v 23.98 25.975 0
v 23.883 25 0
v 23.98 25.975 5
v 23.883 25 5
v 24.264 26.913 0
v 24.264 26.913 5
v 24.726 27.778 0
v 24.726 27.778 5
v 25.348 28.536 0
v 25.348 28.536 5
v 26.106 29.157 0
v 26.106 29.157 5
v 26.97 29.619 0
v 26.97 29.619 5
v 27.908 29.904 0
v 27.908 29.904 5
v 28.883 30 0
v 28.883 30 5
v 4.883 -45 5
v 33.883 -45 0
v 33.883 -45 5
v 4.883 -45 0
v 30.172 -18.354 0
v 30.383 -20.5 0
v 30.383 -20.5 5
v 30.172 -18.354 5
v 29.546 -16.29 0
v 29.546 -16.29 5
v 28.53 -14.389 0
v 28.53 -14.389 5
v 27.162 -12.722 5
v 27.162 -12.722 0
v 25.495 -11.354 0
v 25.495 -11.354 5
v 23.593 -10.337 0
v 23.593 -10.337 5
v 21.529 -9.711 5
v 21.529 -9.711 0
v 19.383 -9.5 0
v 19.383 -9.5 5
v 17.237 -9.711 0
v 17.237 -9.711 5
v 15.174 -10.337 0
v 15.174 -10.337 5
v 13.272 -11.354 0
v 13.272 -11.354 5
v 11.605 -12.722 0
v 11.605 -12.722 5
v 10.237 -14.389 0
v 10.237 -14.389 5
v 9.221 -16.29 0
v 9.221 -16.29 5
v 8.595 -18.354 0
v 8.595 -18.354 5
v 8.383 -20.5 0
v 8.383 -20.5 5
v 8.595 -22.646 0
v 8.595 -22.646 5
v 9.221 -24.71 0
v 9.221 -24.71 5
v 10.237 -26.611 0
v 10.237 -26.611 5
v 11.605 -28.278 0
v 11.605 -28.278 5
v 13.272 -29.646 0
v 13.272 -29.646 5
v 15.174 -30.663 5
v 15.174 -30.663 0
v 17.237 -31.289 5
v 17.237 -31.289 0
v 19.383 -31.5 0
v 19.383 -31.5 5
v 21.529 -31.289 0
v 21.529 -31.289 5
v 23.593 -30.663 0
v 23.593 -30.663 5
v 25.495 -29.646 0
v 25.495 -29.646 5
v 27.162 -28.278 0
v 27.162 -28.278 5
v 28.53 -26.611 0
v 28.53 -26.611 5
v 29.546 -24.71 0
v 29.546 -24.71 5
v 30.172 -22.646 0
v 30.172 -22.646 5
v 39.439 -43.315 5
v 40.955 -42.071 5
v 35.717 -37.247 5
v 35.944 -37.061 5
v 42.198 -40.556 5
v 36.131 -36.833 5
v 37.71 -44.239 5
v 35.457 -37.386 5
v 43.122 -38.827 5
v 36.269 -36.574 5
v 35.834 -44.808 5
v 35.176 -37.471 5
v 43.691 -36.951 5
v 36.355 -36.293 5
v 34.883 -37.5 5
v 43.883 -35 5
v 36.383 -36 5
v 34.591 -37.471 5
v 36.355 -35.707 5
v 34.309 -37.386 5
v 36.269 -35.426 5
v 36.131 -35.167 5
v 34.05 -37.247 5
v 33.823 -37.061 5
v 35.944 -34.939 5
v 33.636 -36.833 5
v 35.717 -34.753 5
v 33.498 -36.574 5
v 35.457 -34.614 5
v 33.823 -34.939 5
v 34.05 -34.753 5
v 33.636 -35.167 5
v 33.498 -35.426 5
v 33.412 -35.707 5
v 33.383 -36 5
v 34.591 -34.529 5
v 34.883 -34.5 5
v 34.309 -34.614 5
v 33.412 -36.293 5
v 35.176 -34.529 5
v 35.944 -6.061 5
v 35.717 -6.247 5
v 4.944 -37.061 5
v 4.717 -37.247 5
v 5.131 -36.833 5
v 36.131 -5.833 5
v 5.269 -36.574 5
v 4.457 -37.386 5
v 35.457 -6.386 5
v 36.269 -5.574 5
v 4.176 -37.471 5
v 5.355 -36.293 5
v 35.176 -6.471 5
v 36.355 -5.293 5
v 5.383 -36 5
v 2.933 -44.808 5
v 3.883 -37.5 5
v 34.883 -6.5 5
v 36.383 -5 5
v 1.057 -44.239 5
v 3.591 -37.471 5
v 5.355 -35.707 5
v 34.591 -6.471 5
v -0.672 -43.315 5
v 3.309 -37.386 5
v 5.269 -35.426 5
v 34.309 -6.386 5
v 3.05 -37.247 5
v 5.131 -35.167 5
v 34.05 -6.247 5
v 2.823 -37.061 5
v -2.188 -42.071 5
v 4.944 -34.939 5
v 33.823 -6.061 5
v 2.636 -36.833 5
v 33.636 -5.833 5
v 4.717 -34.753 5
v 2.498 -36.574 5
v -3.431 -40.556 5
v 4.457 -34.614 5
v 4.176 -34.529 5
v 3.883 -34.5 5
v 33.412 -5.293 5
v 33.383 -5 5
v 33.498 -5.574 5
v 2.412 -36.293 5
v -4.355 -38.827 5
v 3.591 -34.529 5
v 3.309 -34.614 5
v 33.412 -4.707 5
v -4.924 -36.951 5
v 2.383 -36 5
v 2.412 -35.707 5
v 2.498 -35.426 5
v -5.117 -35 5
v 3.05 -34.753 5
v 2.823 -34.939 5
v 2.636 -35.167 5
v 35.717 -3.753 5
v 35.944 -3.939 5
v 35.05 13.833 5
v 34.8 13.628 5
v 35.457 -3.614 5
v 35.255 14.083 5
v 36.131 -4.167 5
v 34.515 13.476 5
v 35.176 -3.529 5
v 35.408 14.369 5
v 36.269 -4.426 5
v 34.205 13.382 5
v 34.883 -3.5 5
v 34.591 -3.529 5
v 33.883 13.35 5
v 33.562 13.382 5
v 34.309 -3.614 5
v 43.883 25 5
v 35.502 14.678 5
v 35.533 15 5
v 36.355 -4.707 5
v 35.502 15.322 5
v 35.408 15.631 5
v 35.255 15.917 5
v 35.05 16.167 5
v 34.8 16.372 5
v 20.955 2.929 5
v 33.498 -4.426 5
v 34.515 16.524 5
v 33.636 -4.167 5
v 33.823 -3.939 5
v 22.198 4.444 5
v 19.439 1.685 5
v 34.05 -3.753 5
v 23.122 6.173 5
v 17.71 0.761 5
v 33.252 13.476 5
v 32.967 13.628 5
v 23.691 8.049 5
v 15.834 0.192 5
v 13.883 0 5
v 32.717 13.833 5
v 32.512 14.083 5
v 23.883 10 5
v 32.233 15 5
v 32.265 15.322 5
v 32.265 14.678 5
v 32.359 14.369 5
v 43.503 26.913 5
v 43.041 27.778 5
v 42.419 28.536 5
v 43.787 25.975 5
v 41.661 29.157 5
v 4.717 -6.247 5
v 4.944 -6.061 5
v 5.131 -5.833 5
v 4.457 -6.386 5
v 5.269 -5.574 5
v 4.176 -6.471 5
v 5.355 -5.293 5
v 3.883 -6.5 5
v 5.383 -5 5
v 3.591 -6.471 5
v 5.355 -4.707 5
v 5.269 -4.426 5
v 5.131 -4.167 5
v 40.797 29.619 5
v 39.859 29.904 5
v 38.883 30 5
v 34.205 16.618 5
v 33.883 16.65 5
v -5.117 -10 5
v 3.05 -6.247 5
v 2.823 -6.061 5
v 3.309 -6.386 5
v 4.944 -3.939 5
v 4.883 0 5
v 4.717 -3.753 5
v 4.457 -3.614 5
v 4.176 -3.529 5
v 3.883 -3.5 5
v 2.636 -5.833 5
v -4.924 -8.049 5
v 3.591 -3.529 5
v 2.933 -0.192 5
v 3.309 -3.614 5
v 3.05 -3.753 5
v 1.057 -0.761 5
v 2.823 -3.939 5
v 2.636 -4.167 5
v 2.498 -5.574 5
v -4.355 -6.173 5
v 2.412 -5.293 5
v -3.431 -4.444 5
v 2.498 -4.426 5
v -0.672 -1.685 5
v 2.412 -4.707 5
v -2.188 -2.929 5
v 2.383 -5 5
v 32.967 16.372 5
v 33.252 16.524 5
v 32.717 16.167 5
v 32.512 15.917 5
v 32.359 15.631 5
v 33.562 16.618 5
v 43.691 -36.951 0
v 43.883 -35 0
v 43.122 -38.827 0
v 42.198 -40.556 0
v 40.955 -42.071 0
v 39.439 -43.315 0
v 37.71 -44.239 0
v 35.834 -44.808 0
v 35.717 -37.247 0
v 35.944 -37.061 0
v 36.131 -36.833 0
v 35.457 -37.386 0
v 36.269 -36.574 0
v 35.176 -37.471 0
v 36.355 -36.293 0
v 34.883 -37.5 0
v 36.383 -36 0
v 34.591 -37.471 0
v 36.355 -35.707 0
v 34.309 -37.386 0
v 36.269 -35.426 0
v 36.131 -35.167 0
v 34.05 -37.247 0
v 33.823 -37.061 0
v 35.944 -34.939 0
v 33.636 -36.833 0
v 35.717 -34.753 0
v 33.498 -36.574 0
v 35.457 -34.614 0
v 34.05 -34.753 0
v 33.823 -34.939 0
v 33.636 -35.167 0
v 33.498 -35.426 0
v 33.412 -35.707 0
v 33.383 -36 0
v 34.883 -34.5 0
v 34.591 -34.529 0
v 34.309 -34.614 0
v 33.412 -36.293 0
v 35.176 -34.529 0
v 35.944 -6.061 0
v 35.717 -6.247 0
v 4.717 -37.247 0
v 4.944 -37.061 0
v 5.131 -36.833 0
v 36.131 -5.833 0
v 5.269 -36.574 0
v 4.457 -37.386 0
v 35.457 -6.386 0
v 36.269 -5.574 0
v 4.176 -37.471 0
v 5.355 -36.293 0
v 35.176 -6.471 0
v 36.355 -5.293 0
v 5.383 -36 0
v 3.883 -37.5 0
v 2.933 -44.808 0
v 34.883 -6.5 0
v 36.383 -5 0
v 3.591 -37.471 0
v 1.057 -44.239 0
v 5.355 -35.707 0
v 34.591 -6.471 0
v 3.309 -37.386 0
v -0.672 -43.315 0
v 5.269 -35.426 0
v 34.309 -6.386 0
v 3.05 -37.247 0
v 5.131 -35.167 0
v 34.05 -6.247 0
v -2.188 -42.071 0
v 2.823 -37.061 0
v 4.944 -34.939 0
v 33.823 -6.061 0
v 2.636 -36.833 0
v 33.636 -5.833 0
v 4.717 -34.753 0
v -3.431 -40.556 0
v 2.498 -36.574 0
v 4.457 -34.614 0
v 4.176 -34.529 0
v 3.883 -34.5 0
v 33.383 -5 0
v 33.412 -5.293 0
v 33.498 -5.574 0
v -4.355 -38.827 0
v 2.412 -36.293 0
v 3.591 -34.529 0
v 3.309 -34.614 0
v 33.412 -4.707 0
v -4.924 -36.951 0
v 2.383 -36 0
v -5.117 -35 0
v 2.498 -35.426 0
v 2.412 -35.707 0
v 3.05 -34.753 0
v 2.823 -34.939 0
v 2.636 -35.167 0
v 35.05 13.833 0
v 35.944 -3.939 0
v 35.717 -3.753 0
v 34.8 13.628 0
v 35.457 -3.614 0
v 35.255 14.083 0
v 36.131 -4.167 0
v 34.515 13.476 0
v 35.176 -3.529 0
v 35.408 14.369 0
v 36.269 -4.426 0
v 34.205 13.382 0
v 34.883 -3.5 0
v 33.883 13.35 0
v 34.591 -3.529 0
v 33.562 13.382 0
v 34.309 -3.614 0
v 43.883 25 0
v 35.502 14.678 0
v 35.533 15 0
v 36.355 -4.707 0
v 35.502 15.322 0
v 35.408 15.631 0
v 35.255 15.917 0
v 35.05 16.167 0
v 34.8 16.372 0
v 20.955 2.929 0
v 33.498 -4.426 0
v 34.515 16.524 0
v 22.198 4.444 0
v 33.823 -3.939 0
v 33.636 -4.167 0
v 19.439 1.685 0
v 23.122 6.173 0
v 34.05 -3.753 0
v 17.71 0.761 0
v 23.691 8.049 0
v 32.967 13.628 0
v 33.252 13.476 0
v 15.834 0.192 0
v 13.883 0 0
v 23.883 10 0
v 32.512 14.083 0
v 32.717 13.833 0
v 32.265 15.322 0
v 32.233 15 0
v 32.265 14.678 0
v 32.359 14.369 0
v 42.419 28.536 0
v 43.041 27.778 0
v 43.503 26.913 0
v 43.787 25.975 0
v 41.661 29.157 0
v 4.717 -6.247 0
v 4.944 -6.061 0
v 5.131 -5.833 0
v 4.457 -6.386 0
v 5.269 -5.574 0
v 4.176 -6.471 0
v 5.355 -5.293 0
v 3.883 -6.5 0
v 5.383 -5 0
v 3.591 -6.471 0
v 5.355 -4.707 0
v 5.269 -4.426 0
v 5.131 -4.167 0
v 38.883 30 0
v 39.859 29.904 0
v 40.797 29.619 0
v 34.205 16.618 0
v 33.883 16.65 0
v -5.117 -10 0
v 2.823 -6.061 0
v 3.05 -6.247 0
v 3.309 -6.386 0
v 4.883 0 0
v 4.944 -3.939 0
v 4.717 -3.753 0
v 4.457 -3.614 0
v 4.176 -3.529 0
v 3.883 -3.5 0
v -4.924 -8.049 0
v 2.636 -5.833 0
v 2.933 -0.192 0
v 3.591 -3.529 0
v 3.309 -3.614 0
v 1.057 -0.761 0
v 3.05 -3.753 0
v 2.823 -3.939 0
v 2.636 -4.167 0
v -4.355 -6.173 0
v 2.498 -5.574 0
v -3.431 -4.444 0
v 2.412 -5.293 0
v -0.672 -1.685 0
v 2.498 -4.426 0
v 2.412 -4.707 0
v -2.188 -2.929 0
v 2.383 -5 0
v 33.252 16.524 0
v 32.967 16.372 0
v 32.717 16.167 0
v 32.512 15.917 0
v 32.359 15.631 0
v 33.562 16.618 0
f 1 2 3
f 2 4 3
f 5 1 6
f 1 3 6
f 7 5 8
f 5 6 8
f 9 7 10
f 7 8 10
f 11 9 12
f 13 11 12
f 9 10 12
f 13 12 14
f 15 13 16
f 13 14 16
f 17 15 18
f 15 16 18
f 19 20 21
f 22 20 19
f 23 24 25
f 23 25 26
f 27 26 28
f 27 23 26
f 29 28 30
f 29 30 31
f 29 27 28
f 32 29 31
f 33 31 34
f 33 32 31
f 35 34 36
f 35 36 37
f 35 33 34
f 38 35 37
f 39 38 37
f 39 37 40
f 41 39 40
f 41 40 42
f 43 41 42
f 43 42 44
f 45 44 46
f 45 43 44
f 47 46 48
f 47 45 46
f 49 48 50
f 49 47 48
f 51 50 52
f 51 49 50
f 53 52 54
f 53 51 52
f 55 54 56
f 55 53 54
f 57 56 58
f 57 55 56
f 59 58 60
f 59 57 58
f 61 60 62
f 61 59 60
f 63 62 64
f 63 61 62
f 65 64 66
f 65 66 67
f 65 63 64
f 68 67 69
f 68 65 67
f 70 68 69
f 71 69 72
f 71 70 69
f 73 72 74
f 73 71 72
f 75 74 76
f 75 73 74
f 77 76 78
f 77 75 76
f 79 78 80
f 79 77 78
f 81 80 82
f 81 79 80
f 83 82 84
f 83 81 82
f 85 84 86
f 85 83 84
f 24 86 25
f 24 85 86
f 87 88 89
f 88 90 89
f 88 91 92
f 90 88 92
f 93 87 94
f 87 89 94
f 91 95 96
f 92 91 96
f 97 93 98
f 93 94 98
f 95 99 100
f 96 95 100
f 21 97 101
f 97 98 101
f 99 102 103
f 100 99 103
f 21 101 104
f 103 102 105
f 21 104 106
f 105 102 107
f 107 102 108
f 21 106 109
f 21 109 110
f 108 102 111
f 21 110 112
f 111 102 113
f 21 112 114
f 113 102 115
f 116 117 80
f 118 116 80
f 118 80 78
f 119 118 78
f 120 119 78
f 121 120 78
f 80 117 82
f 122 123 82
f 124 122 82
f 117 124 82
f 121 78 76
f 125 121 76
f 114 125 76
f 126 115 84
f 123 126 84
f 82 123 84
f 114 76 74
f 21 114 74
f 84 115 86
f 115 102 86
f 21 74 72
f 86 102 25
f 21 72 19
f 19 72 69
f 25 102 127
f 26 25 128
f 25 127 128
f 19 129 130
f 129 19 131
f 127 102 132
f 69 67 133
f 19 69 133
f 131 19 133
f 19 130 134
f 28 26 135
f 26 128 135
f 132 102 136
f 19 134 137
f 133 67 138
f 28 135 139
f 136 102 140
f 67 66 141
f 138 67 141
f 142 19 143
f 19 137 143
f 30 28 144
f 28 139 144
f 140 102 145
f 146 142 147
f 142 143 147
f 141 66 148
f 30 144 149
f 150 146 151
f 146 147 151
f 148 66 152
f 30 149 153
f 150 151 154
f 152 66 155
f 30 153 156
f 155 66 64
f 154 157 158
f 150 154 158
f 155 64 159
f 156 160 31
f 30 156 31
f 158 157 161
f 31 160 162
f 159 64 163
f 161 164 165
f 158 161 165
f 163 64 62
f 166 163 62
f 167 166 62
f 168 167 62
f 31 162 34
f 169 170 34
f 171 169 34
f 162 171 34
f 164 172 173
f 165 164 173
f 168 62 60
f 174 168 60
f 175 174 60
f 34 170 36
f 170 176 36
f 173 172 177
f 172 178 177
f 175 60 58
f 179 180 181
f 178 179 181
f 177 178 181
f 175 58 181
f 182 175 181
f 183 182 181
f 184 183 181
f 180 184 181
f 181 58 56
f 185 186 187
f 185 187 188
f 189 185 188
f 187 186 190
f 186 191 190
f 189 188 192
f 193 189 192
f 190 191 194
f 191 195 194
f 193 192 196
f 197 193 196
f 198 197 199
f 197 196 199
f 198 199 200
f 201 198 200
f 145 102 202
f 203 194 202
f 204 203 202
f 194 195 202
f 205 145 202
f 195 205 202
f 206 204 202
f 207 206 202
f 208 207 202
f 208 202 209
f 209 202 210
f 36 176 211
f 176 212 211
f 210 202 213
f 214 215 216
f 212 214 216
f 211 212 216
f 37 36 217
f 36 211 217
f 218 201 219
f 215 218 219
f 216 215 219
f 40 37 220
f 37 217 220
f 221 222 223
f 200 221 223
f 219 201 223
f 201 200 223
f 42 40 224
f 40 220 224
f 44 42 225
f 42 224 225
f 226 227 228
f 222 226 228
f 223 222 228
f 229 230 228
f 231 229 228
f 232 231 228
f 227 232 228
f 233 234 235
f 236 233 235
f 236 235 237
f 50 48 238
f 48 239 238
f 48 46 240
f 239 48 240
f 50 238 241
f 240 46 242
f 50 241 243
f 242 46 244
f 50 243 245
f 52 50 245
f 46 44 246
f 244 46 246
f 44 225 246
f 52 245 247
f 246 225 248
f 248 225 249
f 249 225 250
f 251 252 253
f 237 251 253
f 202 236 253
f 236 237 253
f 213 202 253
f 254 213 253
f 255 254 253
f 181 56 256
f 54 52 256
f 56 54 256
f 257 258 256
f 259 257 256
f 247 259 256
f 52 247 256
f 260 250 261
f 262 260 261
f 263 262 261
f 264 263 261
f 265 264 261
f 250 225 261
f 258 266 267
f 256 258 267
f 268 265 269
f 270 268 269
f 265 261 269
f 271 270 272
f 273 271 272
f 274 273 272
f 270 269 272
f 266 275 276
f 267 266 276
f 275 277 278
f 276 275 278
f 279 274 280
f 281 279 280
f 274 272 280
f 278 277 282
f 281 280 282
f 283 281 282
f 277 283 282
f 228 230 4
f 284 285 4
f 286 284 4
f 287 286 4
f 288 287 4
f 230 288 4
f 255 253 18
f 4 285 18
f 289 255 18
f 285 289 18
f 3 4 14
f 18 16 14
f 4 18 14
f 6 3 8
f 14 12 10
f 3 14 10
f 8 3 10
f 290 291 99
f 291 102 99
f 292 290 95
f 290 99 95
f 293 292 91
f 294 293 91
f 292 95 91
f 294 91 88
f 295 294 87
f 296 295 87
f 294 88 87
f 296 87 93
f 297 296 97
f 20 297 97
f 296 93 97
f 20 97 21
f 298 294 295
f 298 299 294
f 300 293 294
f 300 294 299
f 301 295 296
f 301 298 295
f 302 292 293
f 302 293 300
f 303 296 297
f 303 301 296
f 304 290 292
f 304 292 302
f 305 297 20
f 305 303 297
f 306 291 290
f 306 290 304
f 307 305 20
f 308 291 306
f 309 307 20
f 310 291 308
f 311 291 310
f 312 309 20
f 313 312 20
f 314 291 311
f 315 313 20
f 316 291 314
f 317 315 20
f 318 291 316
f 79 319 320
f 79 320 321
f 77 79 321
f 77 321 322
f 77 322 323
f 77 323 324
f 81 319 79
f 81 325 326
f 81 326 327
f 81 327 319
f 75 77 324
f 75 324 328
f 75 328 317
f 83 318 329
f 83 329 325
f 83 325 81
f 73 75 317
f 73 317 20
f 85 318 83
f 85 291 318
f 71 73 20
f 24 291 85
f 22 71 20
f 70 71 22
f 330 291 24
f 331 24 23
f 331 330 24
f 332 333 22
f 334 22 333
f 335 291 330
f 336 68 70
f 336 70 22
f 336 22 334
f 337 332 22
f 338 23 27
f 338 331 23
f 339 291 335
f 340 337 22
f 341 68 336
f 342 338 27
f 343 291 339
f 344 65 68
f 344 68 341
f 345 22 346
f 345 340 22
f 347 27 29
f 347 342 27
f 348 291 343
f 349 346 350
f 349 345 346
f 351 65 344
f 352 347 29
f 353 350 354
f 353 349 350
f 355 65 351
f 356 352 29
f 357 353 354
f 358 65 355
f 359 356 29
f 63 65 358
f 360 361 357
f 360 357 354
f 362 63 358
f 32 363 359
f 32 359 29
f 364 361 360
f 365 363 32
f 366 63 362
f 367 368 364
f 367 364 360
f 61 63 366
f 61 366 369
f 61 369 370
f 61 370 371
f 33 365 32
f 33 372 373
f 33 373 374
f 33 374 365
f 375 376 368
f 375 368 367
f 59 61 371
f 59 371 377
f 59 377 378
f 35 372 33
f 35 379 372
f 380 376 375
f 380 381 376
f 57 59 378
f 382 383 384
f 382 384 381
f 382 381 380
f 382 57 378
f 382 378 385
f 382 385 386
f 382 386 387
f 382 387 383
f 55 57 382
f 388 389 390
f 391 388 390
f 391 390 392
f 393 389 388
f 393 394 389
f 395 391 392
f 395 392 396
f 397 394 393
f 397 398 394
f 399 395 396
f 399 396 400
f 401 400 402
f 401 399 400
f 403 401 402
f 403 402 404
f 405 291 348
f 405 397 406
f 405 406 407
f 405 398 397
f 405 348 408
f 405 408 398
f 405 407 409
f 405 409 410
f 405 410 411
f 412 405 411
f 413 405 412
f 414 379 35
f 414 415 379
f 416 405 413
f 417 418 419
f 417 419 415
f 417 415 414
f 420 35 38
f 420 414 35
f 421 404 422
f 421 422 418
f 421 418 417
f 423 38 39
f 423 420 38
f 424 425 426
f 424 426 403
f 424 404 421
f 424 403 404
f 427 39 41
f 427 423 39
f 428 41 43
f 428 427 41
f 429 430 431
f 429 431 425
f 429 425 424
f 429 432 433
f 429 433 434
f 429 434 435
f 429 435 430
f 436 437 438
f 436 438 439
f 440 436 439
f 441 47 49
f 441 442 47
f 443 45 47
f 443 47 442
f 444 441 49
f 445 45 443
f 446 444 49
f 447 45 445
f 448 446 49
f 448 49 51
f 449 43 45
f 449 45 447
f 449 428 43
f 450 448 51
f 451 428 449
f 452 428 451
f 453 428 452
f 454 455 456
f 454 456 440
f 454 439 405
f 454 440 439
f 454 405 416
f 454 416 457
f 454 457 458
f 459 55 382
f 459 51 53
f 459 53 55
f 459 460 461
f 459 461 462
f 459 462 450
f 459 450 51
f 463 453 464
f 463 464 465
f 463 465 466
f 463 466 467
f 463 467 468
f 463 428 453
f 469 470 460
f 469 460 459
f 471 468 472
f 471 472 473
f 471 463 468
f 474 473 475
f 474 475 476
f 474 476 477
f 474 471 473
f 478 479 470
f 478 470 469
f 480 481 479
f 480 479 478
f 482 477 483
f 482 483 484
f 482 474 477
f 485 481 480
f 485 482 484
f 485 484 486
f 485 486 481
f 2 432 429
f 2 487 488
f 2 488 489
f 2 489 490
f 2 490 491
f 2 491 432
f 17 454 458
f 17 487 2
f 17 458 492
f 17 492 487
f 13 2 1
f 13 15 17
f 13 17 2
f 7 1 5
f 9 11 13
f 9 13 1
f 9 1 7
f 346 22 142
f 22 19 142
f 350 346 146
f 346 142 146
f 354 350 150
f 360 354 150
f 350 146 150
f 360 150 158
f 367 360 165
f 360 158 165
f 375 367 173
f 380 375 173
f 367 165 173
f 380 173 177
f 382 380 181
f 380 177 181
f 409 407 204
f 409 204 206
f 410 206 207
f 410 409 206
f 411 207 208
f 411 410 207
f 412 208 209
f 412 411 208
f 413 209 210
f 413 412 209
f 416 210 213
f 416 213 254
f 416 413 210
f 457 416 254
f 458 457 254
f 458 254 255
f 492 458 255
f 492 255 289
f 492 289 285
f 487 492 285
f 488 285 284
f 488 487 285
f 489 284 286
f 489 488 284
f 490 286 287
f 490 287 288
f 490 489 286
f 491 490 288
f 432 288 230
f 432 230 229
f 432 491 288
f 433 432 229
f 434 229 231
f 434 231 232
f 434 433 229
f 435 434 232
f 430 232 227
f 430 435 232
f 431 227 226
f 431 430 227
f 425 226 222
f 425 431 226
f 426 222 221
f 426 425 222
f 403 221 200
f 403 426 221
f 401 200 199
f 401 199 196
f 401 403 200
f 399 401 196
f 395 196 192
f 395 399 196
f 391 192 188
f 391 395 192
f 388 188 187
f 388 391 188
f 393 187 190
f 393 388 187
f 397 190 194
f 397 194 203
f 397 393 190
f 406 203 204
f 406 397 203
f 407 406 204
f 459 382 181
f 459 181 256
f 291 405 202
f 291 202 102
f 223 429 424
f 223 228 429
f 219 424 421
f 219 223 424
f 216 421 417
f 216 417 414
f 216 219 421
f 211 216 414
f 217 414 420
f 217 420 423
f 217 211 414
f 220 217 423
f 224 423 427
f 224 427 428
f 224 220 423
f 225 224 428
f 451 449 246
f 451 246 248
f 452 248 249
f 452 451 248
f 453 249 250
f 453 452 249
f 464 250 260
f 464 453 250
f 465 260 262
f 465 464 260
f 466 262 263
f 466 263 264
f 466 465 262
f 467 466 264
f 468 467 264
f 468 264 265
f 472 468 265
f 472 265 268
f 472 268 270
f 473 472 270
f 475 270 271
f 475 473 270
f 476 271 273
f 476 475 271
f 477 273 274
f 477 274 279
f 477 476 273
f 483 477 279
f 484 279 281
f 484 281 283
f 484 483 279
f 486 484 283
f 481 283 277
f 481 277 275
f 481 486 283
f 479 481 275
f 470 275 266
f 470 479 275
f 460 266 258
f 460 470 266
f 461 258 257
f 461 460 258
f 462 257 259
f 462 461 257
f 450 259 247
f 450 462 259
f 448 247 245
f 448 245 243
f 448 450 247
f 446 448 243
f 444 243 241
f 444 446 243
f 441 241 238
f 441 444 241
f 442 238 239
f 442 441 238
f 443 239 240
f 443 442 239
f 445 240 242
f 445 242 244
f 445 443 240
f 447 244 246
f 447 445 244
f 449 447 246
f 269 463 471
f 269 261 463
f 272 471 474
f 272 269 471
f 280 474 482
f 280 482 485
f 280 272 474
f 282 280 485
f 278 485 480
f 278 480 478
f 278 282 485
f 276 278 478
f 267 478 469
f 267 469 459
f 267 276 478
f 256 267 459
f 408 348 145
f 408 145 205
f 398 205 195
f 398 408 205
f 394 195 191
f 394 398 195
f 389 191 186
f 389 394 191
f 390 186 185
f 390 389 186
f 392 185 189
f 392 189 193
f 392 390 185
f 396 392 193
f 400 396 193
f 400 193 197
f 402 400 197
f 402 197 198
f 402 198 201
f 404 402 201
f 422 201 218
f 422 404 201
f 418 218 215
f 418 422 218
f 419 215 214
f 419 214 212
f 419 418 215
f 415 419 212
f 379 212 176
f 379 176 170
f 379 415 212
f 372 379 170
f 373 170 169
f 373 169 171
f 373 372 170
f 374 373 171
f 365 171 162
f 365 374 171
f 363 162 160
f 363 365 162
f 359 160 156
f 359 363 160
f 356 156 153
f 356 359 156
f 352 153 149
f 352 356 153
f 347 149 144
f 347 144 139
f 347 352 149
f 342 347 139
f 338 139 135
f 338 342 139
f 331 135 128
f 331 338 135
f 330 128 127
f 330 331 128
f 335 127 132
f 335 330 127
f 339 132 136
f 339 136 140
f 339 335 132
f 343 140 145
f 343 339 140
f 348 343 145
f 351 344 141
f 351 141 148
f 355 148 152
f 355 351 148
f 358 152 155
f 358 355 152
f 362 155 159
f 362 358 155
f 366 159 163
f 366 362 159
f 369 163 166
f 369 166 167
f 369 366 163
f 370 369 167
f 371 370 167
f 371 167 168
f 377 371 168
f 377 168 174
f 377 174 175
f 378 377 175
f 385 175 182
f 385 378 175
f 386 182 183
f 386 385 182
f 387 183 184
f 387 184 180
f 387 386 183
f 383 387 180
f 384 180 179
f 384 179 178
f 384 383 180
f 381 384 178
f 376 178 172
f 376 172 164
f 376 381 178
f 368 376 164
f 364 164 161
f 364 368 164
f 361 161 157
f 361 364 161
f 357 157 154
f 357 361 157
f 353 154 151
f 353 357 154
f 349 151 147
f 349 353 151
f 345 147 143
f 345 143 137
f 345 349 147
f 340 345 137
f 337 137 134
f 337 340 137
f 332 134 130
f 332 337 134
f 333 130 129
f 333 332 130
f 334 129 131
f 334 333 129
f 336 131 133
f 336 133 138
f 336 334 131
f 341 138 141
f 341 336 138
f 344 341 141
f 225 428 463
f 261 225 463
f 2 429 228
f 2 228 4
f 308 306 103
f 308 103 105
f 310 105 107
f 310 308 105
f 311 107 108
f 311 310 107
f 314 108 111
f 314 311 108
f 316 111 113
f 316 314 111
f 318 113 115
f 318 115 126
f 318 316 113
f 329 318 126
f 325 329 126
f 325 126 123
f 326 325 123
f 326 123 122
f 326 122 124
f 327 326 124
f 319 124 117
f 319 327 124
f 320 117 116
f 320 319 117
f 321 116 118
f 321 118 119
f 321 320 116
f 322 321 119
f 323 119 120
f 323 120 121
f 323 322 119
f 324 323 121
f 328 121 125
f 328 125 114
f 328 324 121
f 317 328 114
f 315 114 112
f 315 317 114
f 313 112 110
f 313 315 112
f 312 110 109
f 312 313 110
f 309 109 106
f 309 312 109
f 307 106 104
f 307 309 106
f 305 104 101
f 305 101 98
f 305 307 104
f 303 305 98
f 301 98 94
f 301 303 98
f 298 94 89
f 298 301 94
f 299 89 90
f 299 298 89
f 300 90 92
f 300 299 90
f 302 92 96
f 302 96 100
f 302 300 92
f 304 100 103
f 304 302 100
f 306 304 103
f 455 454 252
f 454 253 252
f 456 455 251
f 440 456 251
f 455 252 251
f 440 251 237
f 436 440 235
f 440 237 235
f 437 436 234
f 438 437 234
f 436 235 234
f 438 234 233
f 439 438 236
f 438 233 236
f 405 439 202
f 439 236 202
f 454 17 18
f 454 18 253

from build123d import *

# Parameters (mm, degrees)
SKETCH1_R           = 1.5
SKETCH1_R_2         = 11
SKETCH1_R_3         = 1.65
BOSS_EXTRUDE1_DEPTH = 5
FILLET1_R           = 10
FILLET2_R           = 5


with BuildPart() as part:
    # Sketch1 → Boss-Extrude1 (new body)
    with BuildSketch(Plane.XY):
        Polygon((23.883435073, 30), (43.883435073, 30), (43.883435073, -45), (-5.116564927, -45), (-5.116564927, 0), (0, 0), (23.883435073, 0), align=None)
        with Locations((3.883435073, -5)):
            Circle(SKETCH1_R, mode=Mode.SUBTRACT)
        with Locations((34.883435073, -5)):
            Circle(SKETCH1_R, mode=Mode.SUBTRACT)
        with Locations((3.883435073, -36)):
            Circle(SKETCH1_R, mode=Mode.SUBTRACT)
        with Locations((34.883435073, -36)):
            Circle(SKETCH1_R, mode=Mode.SUBTRACT)
        with Locations((19.383435073, -20.5)):
            Circle(SKETCH1_R_2, mode=Mode.SUBTRACT)
        with Locations((33.883435073, 15)):
            Circle(SKETCH1_R_3, mode=Mode.SUBTRACT)
    extrude(amount=BOSS_EXTRUDE1_DEPTH)

    # Fillet1
    fillet1_edges = [part.edges().sort_by_distance(p)[0] for p in [
        (23.883435073, 0, 2.5),
        (43.883435073, -45, 2.5),
        (-5.116564927, -45, 2.5),
        (-5.116564927, 0, 2.5),
    ]]
    fillet(fillet1_edges, radius=FILLET1_R)

    # Fillet2
    fillet2_edges = [part.edges().sort_by_distance(p)[0] for p in [
        (23.883435073, 30, 2.5),
        (43.883435073, 30, 2.5),
    ]]
    fillet(fillet2_edges, radius=FILLET2_R)


solid = part.part
